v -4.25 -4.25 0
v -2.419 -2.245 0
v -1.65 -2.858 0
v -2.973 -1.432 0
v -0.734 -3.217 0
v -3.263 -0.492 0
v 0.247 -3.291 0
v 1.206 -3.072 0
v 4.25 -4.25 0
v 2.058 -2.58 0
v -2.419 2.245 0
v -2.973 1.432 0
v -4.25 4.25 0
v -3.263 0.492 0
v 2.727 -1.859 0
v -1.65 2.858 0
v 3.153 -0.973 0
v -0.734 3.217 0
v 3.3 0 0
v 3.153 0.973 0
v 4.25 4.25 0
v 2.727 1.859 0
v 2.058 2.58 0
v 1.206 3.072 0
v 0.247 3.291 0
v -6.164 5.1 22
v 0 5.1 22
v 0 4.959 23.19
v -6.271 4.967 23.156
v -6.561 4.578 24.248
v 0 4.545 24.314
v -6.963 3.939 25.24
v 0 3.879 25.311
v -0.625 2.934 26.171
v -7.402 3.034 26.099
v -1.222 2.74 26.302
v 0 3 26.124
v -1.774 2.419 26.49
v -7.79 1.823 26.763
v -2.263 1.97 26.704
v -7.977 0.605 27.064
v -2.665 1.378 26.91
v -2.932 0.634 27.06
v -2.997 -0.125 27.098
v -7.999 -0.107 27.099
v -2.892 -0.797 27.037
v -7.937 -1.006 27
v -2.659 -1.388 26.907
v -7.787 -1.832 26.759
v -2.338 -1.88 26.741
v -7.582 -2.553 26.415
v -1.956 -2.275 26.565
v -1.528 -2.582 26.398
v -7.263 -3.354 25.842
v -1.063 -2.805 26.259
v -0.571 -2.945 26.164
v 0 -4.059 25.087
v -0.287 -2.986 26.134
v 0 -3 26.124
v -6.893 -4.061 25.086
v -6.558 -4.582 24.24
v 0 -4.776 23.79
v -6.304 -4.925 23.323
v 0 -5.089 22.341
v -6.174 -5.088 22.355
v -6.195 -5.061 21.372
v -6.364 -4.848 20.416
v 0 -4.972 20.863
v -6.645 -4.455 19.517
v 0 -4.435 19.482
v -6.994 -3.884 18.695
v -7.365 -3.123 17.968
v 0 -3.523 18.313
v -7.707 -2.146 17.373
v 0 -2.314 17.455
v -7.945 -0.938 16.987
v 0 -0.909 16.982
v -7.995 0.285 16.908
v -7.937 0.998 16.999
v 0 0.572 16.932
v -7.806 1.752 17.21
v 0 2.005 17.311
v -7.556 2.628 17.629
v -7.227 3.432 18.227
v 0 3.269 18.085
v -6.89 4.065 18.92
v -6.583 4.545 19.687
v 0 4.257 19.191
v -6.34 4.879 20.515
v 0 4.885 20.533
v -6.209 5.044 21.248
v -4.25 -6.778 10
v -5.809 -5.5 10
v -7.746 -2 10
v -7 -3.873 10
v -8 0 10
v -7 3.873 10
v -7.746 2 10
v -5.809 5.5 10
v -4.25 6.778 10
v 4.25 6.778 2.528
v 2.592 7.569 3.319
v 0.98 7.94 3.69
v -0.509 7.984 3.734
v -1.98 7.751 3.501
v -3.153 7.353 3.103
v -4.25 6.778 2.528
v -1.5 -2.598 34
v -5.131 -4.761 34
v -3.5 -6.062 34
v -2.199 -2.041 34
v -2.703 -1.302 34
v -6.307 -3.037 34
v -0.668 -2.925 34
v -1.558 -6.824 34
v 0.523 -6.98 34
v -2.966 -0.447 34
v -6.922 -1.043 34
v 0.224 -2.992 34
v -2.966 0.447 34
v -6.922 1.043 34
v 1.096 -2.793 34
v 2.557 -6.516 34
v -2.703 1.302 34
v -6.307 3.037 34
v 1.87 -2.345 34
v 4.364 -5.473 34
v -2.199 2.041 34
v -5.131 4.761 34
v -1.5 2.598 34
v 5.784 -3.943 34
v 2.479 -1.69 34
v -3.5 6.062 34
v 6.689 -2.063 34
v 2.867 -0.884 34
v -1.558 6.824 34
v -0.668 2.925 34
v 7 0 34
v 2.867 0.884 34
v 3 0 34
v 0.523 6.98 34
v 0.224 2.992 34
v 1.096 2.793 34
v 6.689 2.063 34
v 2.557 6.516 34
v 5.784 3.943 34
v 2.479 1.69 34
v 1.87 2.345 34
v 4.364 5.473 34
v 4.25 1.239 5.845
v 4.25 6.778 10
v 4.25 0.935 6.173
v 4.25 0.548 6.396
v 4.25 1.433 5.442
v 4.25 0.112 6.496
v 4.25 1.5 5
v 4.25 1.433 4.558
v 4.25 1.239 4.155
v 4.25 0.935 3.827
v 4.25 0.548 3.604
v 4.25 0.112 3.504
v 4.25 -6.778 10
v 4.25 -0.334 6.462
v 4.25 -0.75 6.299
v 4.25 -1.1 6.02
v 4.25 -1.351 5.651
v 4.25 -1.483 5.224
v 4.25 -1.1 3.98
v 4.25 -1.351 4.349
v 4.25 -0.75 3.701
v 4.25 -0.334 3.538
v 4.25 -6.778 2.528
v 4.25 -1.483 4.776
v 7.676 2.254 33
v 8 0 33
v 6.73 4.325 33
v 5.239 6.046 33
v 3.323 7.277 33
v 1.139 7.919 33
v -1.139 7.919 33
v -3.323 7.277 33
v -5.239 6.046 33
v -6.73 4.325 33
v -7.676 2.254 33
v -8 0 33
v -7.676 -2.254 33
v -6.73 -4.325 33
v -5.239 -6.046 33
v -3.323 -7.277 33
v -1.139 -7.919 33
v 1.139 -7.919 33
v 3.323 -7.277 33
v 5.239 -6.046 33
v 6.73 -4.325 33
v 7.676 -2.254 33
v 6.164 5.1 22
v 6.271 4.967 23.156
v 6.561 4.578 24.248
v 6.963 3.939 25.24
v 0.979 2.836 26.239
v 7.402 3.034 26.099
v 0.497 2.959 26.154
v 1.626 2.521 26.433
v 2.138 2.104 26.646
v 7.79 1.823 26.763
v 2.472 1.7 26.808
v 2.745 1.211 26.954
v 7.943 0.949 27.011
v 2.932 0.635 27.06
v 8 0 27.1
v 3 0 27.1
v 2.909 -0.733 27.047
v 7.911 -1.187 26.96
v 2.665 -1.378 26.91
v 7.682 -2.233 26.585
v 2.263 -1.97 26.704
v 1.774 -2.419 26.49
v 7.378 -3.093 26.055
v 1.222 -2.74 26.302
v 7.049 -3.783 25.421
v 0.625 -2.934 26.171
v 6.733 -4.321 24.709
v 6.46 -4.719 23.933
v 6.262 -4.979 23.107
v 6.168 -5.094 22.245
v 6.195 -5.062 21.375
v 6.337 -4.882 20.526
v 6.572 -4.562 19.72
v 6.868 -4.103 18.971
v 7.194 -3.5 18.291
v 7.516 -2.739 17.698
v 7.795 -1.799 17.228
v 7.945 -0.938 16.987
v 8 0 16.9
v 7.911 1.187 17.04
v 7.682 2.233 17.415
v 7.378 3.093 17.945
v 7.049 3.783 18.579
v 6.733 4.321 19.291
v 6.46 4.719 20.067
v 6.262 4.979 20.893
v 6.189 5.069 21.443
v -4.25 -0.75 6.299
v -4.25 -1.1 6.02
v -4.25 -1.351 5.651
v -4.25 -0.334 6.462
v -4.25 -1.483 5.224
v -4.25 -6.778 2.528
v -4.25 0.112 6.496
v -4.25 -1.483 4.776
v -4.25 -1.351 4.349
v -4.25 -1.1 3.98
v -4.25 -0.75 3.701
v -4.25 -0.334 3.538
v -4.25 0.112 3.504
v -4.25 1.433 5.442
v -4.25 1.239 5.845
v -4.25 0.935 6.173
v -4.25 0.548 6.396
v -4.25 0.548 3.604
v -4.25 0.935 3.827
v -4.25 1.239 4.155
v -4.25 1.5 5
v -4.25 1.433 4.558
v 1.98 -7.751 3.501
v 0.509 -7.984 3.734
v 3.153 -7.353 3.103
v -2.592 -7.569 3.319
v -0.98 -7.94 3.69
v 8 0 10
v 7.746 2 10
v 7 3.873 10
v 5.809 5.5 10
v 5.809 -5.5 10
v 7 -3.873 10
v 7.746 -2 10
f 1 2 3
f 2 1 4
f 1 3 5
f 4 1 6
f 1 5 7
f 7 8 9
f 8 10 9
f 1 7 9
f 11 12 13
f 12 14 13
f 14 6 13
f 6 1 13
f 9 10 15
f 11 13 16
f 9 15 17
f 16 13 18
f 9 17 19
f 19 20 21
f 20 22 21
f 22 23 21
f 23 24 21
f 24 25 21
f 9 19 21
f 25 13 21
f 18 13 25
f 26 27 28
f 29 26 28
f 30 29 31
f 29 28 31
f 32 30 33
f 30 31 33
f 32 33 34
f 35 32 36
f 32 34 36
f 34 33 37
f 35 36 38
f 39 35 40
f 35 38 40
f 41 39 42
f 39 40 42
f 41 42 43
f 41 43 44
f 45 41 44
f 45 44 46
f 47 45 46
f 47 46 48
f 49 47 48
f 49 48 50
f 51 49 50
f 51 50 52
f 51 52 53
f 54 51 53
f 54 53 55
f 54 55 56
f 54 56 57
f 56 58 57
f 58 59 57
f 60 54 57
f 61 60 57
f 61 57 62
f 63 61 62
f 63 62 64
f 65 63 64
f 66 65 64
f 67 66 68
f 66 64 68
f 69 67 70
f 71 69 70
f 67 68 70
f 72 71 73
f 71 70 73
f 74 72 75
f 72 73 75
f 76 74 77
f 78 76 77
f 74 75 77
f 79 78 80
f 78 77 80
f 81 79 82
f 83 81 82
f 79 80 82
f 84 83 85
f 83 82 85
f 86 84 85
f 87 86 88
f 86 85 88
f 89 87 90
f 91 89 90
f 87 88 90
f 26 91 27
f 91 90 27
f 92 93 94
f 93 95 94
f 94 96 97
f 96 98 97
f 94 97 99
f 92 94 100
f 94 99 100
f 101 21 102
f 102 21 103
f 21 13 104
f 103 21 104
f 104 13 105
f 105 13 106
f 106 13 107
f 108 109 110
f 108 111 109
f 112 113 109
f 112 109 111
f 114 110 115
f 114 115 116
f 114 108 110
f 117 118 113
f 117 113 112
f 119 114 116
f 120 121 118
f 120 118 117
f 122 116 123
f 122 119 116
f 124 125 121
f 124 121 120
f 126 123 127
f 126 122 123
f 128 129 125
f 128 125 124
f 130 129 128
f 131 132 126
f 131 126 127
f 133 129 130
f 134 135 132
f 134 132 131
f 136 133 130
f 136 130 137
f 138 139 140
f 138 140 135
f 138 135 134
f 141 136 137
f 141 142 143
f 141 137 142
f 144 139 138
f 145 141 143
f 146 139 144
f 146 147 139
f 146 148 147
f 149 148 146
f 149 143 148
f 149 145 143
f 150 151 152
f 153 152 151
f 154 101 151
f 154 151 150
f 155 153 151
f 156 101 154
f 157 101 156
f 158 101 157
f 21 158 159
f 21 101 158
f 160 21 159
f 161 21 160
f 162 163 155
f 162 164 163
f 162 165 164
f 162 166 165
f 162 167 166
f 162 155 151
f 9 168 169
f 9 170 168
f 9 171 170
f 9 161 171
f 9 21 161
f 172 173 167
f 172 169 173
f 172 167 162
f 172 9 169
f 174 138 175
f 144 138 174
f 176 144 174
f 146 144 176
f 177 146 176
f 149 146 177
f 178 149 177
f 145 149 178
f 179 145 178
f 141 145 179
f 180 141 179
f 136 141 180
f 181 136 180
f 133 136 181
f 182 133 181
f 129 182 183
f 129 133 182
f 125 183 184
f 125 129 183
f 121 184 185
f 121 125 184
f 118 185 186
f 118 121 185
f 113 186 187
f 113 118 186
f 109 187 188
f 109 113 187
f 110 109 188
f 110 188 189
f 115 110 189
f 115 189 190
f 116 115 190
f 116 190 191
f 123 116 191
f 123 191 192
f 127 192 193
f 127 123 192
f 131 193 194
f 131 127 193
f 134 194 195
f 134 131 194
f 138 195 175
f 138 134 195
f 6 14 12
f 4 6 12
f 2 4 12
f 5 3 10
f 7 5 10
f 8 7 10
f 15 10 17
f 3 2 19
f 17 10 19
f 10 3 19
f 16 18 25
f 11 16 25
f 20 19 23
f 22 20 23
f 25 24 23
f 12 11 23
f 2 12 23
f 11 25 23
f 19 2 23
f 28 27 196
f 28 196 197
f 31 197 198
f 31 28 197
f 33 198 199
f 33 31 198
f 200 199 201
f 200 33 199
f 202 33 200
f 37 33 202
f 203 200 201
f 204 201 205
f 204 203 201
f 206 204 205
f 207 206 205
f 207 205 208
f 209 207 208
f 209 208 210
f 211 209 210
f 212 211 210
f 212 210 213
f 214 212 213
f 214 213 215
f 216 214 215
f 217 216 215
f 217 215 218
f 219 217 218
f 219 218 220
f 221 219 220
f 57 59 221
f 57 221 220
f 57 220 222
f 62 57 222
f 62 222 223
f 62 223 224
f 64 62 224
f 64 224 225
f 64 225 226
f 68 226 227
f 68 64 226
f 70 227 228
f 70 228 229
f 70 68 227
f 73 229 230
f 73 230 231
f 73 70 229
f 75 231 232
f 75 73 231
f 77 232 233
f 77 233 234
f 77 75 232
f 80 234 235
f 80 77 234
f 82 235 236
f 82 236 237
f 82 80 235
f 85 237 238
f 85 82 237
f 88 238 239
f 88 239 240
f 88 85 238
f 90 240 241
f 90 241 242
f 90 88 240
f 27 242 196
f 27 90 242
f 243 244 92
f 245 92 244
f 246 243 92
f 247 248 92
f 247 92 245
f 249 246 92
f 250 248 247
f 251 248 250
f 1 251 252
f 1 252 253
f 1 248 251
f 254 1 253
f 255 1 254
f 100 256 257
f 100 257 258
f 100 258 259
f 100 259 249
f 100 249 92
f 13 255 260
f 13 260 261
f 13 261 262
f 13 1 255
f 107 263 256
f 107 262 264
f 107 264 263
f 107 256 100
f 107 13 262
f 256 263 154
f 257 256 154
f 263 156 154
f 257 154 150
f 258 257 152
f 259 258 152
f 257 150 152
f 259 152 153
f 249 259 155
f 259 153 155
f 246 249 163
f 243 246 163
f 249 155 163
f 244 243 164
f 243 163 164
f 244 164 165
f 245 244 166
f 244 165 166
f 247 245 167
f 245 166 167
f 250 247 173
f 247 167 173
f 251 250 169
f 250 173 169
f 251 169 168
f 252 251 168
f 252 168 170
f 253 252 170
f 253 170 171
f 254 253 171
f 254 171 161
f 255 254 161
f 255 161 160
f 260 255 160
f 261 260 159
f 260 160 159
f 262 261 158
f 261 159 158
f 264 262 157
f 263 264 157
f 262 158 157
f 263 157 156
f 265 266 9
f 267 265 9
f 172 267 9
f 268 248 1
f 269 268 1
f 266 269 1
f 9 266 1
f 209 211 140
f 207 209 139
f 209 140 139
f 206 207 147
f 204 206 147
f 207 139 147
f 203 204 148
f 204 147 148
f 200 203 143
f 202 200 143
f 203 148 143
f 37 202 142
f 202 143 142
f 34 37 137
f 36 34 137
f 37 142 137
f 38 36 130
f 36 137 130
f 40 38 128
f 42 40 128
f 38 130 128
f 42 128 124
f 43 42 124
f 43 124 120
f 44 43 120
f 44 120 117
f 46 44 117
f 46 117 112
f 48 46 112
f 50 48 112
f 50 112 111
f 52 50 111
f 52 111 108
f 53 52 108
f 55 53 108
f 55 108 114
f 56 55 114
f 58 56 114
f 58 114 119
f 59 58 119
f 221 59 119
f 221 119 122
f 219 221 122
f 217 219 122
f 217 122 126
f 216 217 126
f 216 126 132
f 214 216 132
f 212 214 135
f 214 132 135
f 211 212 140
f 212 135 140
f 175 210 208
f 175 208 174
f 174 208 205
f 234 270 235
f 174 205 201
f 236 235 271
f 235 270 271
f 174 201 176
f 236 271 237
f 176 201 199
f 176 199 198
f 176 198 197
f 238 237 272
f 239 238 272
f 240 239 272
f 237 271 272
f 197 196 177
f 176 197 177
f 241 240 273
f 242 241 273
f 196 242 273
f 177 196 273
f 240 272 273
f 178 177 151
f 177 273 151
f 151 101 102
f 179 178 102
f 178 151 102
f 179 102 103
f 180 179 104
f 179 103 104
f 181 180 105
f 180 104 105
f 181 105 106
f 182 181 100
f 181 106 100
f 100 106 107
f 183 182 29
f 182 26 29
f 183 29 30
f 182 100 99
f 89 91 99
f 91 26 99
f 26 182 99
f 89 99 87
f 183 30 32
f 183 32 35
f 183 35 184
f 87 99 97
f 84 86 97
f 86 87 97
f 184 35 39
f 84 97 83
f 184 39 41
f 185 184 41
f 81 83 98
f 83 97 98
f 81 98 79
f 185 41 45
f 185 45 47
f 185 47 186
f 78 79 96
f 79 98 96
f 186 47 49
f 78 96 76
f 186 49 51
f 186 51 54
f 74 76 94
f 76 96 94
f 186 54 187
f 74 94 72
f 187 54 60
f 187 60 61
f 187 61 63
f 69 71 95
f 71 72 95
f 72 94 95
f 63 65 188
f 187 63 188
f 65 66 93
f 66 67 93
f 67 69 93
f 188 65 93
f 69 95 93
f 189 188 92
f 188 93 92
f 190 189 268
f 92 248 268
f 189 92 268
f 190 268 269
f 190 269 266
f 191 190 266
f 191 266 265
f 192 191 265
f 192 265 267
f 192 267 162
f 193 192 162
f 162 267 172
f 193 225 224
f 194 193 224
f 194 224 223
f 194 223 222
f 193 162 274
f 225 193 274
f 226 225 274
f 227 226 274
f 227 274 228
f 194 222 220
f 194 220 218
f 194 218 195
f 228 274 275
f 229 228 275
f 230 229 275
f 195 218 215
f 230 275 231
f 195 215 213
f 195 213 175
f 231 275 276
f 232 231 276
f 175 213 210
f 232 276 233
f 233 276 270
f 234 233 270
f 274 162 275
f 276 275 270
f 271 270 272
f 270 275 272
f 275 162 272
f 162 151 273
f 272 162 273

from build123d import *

# Parameters (mm, degrees)
F0_R      = 8
F1_DEPTH  = 34
F2_R      = 5.1
F2_R_2    = 1.5
F3_DEPTH  = 50
F4_SIZE   = 1
F6_DEPTH  = 10
F8_DEPTH  = 25
F9_R      = 3.3
F10_DEPTH = 12
F12_R     = 3
F13_DEPTH = 12


with BuildPart() as f1:
    # F0 (on Top) → F1 (new body)
    with BuildSketch(Plane.XY):
        Circle(F0_R)
    extrude(amount=F1_DEPTH)

    # F2 (on Right) → F3 (cut, symmetric)
    with BuildSketch(Plane.YZ):
        with Locations((0, 22)):
            Circle(F2_R)
        with Locations((0, 5)):
            Circle(F2_R_2)
    extrude(amount=F3_DEPTH, both=True, mode=Mode.SUBTRACT)

    # F4
    f4_edges = [f1.edges().sort_by_distance(p)[0] for p in [
        (-8, 0, 34),
    ]]
    chamfer(f4_edges, length=F4_SIZE)

    # F5 (on Top) → F6 (cut)
    with BuildSketch(Plane.XY):
        Polygon((13.330229, -8.80704), (13.330229, 8.80704), (4.25, 8.80704), (4.25, 0), (4.25, -8.80704), align=None)
        Polygon((-4.25, 8.80704), (-13.330229, 8.80704), (-13.330229, -8.80704), (-4.25, -8.80704), (-4.25, 0), align=None)
    extrude(amount=F6_DEPTH, mode=Mode.SUBTRACT)

    # F7 (on face) → F8 (cut)
    with BuildSketch(Plane(origin=(-4.25, 0, 0), x_dir=(0, -1, 0), z_dir=(-1, 0, 0))):
        Polygon((-9.396474, 0), (-4.25, 0), (-9.098946, 4.848946), align=None)
        Polygon((8.720067, 4.470067), (4.25, 0), (10.144616, 0), align=None)
    extrude(amount=-F8_DEPTH, mode=Mode.SUBTRACT)

    # F9 (on Top) → F10 (cut)
    with BuildSketch(Plane.XY):
        Circle(F9_R)
    extrude(amount=-F10_DEPTH, mode=Mode.SUBTRACT)

    # F12 (on face) → F13 (cut)
    with BuildSketch(Plane.XY.offset(34)):
        Circle(F12_R)
    extrude(amount=-F13_DEPTH, mode=Mode.SUBTRACT)


solid = f1.part
